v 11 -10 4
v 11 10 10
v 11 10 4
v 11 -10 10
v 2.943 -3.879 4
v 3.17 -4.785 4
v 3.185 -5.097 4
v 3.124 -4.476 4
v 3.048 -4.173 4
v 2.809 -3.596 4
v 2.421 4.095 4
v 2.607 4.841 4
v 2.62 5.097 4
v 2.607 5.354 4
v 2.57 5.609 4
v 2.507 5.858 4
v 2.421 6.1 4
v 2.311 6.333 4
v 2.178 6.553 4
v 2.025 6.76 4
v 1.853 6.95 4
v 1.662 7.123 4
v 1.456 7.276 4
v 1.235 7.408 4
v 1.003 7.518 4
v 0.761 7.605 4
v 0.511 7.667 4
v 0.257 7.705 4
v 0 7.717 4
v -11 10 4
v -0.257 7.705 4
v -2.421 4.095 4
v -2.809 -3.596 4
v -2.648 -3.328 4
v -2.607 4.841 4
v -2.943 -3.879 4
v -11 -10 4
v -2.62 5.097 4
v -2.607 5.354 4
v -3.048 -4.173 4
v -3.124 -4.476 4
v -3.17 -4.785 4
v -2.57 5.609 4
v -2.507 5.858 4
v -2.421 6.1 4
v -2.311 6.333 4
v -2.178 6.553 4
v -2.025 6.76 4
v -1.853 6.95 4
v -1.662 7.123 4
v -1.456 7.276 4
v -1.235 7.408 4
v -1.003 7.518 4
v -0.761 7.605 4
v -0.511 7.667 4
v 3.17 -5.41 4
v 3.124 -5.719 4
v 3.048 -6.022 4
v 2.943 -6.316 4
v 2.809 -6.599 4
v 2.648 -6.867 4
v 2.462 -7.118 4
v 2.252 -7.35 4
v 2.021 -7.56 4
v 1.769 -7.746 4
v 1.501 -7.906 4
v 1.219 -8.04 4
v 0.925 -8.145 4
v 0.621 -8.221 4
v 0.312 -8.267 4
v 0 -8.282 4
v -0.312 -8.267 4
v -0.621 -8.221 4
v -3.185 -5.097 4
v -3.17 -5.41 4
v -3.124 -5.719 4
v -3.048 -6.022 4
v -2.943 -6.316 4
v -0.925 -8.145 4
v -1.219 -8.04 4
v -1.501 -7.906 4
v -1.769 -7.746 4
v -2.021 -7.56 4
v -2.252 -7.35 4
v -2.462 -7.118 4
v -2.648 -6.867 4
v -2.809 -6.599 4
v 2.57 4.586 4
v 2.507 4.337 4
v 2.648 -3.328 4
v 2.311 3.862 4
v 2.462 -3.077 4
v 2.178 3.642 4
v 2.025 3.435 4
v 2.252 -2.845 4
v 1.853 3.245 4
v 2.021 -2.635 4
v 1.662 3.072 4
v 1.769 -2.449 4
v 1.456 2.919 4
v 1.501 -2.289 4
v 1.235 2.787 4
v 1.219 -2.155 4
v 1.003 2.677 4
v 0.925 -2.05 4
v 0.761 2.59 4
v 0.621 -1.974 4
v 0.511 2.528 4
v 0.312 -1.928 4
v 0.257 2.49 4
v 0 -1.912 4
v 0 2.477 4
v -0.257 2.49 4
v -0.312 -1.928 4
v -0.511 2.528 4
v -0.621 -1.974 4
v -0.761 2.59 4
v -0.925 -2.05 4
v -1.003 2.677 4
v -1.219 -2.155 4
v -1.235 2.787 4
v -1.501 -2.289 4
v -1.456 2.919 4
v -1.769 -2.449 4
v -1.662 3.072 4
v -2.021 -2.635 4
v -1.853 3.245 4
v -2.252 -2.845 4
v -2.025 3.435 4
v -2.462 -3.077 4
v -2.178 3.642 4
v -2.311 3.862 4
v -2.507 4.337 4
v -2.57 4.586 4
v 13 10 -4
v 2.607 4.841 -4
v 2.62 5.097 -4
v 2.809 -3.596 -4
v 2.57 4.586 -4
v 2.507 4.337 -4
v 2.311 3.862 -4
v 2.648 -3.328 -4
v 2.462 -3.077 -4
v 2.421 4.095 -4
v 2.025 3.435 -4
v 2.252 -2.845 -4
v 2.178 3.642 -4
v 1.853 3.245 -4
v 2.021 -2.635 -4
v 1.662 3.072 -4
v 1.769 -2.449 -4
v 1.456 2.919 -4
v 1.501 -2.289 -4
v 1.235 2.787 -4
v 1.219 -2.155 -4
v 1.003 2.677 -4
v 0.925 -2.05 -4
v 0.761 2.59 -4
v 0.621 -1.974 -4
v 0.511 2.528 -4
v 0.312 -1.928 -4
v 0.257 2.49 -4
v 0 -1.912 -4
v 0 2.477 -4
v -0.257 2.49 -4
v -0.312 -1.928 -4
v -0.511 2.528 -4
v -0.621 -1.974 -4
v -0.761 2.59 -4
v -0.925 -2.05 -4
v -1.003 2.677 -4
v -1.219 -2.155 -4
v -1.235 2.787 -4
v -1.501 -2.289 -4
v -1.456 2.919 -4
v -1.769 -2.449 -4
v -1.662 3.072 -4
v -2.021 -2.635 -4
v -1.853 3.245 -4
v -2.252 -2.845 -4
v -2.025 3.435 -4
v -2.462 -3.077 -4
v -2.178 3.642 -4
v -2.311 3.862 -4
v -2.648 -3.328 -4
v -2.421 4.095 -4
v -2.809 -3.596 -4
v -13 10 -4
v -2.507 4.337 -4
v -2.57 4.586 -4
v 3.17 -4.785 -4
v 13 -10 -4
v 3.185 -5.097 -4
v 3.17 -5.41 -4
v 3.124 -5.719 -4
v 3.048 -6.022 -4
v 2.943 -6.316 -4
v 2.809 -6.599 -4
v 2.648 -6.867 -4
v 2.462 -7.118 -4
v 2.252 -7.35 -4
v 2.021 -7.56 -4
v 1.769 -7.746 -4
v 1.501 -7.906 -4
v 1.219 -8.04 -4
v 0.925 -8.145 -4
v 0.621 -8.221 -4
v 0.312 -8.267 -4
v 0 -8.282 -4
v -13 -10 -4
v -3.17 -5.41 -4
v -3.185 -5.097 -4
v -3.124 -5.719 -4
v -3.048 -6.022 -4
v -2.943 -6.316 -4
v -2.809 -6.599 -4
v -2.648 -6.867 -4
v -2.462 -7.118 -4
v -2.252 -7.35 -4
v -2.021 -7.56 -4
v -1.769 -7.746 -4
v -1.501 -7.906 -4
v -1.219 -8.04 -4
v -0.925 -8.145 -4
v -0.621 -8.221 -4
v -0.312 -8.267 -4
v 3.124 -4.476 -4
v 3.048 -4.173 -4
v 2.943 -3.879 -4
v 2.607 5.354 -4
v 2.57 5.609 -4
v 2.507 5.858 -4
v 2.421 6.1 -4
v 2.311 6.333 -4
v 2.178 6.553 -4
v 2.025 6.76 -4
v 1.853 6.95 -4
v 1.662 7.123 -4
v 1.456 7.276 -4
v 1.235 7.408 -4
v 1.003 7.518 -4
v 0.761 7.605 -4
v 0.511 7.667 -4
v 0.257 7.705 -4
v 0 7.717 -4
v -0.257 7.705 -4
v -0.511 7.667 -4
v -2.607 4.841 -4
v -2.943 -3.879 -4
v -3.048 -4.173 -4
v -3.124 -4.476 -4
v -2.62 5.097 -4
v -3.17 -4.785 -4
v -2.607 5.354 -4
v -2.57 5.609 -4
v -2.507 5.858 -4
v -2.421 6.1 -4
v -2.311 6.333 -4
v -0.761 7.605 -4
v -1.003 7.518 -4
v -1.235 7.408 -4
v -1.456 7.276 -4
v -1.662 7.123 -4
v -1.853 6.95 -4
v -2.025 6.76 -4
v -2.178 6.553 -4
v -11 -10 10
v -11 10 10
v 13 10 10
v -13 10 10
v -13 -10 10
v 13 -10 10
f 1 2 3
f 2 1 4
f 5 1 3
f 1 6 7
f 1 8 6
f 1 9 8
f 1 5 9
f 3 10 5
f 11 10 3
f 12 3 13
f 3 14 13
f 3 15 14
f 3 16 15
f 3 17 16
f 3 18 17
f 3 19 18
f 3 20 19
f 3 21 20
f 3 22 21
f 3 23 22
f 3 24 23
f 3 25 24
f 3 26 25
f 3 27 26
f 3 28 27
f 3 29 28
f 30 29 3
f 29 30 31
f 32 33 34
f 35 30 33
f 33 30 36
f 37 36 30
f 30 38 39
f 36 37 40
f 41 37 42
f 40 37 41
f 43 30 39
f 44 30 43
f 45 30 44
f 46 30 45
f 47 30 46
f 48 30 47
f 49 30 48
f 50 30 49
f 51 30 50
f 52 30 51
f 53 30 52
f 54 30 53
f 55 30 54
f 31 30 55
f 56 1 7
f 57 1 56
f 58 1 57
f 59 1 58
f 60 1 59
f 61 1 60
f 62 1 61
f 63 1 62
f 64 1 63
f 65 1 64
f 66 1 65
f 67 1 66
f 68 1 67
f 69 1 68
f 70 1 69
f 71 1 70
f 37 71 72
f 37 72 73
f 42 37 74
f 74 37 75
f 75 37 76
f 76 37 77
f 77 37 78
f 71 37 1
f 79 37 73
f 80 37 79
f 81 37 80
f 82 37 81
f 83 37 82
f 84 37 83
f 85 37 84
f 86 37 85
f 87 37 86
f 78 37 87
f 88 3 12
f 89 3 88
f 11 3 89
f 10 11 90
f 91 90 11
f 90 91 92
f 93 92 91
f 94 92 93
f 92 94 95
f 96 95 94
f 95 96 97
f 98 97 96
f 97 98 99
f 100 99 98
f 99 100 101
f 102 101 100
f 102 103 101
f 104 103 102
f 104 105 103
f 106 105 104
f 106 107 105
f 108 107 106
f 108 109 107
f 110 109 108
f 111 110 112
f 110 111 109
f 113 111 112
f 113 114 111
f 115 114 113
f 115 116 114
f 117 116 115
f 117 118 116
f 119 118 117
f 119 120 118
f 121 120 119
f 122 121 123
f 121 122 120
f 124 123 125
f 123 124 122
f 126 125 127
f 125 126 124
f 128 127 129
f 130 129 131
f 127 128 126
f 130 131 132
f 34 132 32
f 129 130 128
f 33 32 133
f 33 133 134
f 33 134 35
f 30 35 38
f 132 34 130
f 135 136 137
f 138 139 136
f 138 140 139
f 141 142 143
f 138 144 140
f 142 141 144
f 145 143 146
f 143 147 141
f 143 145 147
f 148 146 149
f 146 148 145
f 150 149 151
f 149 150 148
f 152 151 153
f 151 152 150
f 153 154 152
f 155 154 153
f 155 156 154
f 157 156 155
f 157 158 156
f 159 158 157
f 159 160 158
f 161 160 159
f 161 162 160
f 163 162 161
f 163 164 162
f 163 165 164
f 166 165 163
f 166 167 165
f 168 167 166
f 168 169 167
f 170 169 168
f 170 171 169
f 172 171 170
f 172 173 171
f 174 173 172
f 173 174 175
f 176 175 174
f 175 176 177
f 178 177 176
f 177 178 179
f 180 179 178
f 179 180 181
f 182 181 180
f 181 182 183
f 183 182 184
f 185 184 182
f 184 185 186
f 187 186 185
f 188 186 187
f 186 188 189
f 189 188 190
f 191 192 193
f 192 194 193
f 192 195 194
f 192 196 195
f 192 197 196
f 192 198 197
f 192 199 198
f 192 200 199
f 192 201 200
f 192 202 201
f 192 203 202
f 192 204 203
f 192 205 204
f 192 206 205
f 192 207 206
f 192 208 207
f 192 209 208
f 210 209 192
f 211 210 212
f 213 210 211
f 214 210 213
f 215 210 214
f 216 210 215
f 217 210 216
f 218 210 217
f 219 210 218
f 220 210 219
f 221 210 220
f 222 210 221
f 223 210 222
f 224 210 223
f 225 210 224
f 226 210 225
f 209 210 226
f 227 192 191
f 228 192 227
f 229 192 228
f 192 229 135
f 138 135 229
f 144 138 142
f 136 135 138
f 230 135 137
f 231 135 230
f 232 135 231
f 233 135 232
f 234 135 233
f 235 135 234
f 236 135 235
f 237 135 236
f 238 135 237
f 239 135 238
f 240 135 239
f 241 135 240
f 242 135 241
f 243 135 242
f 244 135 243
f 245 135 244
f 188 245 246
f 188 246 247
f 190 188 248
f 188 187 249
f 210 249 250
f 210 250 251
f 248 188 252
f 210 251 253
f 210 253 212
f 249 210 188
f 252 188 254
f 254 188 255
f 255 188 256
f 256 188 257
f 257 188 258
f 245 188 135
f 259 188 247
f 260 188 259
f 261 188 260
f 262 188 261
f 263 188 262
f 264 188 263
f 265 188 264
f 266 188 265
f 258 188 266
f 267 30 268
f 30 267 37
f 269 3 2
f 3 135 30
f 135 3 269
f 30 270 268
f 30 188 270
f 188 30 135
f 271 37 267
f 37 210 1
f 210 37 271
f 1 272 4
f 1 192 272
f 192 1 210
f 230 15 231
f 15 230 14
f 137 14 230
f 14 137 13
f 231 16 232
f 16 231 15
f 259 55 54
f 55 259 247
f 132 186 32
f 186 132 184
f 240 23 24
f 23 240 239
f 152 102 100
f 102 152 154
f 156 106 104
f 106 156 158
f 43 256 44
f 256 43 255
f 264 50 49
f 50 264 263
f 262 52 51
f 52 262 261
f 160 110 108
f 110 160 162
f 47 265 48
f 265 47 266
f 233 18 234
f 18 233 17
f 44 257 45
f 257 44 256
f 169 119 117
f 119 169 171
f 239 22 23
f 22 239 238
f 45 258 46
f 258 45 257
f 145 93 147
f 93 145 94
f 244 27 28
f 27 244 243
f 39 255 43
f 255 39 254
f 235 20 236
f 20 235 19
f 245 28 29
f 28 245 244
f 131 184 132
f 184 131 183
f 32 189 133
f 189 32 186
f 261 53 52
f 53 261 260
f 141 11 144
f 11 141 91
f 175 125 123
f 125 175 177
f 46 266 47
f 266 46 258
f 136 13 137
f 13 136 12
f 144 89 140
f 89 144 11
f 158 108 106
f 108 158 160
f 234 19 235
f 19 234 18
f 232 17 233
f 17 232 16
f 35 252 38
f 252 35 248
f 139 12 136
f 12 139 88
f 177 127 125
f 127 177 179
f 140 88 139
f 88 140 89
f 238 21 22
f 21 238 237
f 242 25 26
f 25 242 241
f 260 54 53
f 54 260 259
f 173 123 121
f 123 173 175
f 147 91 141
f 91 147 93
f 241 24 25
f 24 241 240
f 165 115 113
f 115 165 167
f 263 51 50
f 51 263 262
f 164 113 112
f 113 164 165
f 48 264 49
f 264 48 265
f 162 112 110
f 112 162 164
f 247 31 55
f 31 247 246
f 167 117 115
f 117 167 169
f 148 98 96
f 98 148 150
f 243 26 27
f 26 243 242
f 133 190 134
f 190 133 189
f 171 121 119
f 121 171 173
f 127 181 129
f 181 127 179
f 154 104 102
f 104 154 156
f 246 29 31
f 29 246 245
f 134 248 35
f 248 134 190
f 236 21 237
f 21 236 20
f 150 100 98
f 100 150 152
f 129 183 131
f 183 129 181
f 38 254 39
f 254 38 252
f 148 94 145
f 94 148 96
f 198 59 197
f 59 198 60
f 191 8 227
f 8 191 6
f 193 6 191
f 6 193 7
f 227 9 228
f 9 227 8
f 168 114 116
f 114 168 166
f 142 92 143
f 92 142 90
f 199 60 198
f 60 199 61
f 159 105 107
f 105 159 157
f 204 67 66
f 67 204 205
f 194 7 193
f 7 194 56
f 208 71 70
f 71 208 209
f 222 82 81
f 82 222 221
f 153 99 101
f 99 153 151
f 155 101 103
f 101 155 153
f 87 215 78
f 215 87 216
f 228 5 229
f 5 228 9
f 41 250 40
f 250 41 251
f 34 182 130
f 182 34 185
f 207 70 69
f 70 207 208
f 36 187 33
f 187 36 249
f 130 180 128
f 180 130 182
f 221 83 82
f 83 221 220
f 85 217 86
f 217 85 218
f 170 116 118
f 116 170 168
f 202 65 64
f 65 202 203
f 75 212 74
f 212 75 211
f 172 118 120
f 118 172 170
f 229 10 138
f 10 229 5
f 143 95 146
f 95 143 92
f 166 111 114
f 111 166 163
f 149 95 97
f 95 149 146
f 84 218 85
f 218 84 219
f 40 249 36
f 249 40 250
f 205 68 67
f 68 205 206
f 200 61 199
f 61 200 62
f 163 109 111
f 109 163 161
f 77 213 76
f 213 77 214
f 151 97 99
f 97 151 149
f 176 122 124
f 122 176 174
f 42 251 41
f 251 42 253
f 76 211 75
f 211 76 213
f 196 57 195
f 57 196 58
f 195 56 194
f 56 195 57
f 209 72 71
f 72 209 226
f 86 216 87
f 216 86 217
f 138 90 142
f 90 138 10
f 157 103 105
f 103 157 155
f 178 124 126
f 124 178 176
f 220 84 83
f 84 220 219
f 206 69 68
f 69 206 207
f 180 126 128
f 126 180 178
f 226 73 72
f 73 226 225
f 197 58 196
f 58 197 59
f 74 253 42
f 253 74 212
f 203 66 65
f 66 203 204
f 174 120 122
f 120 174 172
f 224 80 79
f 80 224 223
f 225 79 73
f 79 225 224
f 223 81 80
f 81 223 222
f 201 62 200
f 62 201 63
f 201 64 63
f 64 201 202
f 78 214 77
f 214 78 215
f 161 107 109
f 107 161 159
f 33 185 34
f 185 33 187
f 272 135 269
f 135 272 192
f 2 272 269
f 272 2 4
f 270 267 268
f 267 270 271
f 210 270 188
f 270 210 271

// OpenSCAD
railX=22.0;
railY=20;
railZ=8;

frameThickness=2;
frameHeight=6;



guardholeD=6.37;
holeD=5.24;

holeDistance=16-guardholeD/2-holeD/2;
echo(holeDistance);

guardholeX=0;
guardholeY=-holeDistance/2;

holeX=0;
holeY=holeDistance/2;

module Reverbuilt()
{
difference() {
    cube([railX,railY,railZ],center=true);
    translate([holeX,holeY,0])cylinder(d=holeD,h=railZ+0.01,$fn=64,center=true);
    translate([guardholeX,guardholeY,0])cylinder(d=guardholeD,h=railZ+0.01,$fn=64,center=true);
}

//Frame
translate([railX/2+frameThickness/2,0,frameHeight/2])cube([frameThickness,railY,railZ+frameHeight],center=true);
translate([-railX/2-frameThickness/2,0,frameHeight/2])cube([frameThickness,railY,railZ+frameHeight],center=true);

}

Reverbuilt();
